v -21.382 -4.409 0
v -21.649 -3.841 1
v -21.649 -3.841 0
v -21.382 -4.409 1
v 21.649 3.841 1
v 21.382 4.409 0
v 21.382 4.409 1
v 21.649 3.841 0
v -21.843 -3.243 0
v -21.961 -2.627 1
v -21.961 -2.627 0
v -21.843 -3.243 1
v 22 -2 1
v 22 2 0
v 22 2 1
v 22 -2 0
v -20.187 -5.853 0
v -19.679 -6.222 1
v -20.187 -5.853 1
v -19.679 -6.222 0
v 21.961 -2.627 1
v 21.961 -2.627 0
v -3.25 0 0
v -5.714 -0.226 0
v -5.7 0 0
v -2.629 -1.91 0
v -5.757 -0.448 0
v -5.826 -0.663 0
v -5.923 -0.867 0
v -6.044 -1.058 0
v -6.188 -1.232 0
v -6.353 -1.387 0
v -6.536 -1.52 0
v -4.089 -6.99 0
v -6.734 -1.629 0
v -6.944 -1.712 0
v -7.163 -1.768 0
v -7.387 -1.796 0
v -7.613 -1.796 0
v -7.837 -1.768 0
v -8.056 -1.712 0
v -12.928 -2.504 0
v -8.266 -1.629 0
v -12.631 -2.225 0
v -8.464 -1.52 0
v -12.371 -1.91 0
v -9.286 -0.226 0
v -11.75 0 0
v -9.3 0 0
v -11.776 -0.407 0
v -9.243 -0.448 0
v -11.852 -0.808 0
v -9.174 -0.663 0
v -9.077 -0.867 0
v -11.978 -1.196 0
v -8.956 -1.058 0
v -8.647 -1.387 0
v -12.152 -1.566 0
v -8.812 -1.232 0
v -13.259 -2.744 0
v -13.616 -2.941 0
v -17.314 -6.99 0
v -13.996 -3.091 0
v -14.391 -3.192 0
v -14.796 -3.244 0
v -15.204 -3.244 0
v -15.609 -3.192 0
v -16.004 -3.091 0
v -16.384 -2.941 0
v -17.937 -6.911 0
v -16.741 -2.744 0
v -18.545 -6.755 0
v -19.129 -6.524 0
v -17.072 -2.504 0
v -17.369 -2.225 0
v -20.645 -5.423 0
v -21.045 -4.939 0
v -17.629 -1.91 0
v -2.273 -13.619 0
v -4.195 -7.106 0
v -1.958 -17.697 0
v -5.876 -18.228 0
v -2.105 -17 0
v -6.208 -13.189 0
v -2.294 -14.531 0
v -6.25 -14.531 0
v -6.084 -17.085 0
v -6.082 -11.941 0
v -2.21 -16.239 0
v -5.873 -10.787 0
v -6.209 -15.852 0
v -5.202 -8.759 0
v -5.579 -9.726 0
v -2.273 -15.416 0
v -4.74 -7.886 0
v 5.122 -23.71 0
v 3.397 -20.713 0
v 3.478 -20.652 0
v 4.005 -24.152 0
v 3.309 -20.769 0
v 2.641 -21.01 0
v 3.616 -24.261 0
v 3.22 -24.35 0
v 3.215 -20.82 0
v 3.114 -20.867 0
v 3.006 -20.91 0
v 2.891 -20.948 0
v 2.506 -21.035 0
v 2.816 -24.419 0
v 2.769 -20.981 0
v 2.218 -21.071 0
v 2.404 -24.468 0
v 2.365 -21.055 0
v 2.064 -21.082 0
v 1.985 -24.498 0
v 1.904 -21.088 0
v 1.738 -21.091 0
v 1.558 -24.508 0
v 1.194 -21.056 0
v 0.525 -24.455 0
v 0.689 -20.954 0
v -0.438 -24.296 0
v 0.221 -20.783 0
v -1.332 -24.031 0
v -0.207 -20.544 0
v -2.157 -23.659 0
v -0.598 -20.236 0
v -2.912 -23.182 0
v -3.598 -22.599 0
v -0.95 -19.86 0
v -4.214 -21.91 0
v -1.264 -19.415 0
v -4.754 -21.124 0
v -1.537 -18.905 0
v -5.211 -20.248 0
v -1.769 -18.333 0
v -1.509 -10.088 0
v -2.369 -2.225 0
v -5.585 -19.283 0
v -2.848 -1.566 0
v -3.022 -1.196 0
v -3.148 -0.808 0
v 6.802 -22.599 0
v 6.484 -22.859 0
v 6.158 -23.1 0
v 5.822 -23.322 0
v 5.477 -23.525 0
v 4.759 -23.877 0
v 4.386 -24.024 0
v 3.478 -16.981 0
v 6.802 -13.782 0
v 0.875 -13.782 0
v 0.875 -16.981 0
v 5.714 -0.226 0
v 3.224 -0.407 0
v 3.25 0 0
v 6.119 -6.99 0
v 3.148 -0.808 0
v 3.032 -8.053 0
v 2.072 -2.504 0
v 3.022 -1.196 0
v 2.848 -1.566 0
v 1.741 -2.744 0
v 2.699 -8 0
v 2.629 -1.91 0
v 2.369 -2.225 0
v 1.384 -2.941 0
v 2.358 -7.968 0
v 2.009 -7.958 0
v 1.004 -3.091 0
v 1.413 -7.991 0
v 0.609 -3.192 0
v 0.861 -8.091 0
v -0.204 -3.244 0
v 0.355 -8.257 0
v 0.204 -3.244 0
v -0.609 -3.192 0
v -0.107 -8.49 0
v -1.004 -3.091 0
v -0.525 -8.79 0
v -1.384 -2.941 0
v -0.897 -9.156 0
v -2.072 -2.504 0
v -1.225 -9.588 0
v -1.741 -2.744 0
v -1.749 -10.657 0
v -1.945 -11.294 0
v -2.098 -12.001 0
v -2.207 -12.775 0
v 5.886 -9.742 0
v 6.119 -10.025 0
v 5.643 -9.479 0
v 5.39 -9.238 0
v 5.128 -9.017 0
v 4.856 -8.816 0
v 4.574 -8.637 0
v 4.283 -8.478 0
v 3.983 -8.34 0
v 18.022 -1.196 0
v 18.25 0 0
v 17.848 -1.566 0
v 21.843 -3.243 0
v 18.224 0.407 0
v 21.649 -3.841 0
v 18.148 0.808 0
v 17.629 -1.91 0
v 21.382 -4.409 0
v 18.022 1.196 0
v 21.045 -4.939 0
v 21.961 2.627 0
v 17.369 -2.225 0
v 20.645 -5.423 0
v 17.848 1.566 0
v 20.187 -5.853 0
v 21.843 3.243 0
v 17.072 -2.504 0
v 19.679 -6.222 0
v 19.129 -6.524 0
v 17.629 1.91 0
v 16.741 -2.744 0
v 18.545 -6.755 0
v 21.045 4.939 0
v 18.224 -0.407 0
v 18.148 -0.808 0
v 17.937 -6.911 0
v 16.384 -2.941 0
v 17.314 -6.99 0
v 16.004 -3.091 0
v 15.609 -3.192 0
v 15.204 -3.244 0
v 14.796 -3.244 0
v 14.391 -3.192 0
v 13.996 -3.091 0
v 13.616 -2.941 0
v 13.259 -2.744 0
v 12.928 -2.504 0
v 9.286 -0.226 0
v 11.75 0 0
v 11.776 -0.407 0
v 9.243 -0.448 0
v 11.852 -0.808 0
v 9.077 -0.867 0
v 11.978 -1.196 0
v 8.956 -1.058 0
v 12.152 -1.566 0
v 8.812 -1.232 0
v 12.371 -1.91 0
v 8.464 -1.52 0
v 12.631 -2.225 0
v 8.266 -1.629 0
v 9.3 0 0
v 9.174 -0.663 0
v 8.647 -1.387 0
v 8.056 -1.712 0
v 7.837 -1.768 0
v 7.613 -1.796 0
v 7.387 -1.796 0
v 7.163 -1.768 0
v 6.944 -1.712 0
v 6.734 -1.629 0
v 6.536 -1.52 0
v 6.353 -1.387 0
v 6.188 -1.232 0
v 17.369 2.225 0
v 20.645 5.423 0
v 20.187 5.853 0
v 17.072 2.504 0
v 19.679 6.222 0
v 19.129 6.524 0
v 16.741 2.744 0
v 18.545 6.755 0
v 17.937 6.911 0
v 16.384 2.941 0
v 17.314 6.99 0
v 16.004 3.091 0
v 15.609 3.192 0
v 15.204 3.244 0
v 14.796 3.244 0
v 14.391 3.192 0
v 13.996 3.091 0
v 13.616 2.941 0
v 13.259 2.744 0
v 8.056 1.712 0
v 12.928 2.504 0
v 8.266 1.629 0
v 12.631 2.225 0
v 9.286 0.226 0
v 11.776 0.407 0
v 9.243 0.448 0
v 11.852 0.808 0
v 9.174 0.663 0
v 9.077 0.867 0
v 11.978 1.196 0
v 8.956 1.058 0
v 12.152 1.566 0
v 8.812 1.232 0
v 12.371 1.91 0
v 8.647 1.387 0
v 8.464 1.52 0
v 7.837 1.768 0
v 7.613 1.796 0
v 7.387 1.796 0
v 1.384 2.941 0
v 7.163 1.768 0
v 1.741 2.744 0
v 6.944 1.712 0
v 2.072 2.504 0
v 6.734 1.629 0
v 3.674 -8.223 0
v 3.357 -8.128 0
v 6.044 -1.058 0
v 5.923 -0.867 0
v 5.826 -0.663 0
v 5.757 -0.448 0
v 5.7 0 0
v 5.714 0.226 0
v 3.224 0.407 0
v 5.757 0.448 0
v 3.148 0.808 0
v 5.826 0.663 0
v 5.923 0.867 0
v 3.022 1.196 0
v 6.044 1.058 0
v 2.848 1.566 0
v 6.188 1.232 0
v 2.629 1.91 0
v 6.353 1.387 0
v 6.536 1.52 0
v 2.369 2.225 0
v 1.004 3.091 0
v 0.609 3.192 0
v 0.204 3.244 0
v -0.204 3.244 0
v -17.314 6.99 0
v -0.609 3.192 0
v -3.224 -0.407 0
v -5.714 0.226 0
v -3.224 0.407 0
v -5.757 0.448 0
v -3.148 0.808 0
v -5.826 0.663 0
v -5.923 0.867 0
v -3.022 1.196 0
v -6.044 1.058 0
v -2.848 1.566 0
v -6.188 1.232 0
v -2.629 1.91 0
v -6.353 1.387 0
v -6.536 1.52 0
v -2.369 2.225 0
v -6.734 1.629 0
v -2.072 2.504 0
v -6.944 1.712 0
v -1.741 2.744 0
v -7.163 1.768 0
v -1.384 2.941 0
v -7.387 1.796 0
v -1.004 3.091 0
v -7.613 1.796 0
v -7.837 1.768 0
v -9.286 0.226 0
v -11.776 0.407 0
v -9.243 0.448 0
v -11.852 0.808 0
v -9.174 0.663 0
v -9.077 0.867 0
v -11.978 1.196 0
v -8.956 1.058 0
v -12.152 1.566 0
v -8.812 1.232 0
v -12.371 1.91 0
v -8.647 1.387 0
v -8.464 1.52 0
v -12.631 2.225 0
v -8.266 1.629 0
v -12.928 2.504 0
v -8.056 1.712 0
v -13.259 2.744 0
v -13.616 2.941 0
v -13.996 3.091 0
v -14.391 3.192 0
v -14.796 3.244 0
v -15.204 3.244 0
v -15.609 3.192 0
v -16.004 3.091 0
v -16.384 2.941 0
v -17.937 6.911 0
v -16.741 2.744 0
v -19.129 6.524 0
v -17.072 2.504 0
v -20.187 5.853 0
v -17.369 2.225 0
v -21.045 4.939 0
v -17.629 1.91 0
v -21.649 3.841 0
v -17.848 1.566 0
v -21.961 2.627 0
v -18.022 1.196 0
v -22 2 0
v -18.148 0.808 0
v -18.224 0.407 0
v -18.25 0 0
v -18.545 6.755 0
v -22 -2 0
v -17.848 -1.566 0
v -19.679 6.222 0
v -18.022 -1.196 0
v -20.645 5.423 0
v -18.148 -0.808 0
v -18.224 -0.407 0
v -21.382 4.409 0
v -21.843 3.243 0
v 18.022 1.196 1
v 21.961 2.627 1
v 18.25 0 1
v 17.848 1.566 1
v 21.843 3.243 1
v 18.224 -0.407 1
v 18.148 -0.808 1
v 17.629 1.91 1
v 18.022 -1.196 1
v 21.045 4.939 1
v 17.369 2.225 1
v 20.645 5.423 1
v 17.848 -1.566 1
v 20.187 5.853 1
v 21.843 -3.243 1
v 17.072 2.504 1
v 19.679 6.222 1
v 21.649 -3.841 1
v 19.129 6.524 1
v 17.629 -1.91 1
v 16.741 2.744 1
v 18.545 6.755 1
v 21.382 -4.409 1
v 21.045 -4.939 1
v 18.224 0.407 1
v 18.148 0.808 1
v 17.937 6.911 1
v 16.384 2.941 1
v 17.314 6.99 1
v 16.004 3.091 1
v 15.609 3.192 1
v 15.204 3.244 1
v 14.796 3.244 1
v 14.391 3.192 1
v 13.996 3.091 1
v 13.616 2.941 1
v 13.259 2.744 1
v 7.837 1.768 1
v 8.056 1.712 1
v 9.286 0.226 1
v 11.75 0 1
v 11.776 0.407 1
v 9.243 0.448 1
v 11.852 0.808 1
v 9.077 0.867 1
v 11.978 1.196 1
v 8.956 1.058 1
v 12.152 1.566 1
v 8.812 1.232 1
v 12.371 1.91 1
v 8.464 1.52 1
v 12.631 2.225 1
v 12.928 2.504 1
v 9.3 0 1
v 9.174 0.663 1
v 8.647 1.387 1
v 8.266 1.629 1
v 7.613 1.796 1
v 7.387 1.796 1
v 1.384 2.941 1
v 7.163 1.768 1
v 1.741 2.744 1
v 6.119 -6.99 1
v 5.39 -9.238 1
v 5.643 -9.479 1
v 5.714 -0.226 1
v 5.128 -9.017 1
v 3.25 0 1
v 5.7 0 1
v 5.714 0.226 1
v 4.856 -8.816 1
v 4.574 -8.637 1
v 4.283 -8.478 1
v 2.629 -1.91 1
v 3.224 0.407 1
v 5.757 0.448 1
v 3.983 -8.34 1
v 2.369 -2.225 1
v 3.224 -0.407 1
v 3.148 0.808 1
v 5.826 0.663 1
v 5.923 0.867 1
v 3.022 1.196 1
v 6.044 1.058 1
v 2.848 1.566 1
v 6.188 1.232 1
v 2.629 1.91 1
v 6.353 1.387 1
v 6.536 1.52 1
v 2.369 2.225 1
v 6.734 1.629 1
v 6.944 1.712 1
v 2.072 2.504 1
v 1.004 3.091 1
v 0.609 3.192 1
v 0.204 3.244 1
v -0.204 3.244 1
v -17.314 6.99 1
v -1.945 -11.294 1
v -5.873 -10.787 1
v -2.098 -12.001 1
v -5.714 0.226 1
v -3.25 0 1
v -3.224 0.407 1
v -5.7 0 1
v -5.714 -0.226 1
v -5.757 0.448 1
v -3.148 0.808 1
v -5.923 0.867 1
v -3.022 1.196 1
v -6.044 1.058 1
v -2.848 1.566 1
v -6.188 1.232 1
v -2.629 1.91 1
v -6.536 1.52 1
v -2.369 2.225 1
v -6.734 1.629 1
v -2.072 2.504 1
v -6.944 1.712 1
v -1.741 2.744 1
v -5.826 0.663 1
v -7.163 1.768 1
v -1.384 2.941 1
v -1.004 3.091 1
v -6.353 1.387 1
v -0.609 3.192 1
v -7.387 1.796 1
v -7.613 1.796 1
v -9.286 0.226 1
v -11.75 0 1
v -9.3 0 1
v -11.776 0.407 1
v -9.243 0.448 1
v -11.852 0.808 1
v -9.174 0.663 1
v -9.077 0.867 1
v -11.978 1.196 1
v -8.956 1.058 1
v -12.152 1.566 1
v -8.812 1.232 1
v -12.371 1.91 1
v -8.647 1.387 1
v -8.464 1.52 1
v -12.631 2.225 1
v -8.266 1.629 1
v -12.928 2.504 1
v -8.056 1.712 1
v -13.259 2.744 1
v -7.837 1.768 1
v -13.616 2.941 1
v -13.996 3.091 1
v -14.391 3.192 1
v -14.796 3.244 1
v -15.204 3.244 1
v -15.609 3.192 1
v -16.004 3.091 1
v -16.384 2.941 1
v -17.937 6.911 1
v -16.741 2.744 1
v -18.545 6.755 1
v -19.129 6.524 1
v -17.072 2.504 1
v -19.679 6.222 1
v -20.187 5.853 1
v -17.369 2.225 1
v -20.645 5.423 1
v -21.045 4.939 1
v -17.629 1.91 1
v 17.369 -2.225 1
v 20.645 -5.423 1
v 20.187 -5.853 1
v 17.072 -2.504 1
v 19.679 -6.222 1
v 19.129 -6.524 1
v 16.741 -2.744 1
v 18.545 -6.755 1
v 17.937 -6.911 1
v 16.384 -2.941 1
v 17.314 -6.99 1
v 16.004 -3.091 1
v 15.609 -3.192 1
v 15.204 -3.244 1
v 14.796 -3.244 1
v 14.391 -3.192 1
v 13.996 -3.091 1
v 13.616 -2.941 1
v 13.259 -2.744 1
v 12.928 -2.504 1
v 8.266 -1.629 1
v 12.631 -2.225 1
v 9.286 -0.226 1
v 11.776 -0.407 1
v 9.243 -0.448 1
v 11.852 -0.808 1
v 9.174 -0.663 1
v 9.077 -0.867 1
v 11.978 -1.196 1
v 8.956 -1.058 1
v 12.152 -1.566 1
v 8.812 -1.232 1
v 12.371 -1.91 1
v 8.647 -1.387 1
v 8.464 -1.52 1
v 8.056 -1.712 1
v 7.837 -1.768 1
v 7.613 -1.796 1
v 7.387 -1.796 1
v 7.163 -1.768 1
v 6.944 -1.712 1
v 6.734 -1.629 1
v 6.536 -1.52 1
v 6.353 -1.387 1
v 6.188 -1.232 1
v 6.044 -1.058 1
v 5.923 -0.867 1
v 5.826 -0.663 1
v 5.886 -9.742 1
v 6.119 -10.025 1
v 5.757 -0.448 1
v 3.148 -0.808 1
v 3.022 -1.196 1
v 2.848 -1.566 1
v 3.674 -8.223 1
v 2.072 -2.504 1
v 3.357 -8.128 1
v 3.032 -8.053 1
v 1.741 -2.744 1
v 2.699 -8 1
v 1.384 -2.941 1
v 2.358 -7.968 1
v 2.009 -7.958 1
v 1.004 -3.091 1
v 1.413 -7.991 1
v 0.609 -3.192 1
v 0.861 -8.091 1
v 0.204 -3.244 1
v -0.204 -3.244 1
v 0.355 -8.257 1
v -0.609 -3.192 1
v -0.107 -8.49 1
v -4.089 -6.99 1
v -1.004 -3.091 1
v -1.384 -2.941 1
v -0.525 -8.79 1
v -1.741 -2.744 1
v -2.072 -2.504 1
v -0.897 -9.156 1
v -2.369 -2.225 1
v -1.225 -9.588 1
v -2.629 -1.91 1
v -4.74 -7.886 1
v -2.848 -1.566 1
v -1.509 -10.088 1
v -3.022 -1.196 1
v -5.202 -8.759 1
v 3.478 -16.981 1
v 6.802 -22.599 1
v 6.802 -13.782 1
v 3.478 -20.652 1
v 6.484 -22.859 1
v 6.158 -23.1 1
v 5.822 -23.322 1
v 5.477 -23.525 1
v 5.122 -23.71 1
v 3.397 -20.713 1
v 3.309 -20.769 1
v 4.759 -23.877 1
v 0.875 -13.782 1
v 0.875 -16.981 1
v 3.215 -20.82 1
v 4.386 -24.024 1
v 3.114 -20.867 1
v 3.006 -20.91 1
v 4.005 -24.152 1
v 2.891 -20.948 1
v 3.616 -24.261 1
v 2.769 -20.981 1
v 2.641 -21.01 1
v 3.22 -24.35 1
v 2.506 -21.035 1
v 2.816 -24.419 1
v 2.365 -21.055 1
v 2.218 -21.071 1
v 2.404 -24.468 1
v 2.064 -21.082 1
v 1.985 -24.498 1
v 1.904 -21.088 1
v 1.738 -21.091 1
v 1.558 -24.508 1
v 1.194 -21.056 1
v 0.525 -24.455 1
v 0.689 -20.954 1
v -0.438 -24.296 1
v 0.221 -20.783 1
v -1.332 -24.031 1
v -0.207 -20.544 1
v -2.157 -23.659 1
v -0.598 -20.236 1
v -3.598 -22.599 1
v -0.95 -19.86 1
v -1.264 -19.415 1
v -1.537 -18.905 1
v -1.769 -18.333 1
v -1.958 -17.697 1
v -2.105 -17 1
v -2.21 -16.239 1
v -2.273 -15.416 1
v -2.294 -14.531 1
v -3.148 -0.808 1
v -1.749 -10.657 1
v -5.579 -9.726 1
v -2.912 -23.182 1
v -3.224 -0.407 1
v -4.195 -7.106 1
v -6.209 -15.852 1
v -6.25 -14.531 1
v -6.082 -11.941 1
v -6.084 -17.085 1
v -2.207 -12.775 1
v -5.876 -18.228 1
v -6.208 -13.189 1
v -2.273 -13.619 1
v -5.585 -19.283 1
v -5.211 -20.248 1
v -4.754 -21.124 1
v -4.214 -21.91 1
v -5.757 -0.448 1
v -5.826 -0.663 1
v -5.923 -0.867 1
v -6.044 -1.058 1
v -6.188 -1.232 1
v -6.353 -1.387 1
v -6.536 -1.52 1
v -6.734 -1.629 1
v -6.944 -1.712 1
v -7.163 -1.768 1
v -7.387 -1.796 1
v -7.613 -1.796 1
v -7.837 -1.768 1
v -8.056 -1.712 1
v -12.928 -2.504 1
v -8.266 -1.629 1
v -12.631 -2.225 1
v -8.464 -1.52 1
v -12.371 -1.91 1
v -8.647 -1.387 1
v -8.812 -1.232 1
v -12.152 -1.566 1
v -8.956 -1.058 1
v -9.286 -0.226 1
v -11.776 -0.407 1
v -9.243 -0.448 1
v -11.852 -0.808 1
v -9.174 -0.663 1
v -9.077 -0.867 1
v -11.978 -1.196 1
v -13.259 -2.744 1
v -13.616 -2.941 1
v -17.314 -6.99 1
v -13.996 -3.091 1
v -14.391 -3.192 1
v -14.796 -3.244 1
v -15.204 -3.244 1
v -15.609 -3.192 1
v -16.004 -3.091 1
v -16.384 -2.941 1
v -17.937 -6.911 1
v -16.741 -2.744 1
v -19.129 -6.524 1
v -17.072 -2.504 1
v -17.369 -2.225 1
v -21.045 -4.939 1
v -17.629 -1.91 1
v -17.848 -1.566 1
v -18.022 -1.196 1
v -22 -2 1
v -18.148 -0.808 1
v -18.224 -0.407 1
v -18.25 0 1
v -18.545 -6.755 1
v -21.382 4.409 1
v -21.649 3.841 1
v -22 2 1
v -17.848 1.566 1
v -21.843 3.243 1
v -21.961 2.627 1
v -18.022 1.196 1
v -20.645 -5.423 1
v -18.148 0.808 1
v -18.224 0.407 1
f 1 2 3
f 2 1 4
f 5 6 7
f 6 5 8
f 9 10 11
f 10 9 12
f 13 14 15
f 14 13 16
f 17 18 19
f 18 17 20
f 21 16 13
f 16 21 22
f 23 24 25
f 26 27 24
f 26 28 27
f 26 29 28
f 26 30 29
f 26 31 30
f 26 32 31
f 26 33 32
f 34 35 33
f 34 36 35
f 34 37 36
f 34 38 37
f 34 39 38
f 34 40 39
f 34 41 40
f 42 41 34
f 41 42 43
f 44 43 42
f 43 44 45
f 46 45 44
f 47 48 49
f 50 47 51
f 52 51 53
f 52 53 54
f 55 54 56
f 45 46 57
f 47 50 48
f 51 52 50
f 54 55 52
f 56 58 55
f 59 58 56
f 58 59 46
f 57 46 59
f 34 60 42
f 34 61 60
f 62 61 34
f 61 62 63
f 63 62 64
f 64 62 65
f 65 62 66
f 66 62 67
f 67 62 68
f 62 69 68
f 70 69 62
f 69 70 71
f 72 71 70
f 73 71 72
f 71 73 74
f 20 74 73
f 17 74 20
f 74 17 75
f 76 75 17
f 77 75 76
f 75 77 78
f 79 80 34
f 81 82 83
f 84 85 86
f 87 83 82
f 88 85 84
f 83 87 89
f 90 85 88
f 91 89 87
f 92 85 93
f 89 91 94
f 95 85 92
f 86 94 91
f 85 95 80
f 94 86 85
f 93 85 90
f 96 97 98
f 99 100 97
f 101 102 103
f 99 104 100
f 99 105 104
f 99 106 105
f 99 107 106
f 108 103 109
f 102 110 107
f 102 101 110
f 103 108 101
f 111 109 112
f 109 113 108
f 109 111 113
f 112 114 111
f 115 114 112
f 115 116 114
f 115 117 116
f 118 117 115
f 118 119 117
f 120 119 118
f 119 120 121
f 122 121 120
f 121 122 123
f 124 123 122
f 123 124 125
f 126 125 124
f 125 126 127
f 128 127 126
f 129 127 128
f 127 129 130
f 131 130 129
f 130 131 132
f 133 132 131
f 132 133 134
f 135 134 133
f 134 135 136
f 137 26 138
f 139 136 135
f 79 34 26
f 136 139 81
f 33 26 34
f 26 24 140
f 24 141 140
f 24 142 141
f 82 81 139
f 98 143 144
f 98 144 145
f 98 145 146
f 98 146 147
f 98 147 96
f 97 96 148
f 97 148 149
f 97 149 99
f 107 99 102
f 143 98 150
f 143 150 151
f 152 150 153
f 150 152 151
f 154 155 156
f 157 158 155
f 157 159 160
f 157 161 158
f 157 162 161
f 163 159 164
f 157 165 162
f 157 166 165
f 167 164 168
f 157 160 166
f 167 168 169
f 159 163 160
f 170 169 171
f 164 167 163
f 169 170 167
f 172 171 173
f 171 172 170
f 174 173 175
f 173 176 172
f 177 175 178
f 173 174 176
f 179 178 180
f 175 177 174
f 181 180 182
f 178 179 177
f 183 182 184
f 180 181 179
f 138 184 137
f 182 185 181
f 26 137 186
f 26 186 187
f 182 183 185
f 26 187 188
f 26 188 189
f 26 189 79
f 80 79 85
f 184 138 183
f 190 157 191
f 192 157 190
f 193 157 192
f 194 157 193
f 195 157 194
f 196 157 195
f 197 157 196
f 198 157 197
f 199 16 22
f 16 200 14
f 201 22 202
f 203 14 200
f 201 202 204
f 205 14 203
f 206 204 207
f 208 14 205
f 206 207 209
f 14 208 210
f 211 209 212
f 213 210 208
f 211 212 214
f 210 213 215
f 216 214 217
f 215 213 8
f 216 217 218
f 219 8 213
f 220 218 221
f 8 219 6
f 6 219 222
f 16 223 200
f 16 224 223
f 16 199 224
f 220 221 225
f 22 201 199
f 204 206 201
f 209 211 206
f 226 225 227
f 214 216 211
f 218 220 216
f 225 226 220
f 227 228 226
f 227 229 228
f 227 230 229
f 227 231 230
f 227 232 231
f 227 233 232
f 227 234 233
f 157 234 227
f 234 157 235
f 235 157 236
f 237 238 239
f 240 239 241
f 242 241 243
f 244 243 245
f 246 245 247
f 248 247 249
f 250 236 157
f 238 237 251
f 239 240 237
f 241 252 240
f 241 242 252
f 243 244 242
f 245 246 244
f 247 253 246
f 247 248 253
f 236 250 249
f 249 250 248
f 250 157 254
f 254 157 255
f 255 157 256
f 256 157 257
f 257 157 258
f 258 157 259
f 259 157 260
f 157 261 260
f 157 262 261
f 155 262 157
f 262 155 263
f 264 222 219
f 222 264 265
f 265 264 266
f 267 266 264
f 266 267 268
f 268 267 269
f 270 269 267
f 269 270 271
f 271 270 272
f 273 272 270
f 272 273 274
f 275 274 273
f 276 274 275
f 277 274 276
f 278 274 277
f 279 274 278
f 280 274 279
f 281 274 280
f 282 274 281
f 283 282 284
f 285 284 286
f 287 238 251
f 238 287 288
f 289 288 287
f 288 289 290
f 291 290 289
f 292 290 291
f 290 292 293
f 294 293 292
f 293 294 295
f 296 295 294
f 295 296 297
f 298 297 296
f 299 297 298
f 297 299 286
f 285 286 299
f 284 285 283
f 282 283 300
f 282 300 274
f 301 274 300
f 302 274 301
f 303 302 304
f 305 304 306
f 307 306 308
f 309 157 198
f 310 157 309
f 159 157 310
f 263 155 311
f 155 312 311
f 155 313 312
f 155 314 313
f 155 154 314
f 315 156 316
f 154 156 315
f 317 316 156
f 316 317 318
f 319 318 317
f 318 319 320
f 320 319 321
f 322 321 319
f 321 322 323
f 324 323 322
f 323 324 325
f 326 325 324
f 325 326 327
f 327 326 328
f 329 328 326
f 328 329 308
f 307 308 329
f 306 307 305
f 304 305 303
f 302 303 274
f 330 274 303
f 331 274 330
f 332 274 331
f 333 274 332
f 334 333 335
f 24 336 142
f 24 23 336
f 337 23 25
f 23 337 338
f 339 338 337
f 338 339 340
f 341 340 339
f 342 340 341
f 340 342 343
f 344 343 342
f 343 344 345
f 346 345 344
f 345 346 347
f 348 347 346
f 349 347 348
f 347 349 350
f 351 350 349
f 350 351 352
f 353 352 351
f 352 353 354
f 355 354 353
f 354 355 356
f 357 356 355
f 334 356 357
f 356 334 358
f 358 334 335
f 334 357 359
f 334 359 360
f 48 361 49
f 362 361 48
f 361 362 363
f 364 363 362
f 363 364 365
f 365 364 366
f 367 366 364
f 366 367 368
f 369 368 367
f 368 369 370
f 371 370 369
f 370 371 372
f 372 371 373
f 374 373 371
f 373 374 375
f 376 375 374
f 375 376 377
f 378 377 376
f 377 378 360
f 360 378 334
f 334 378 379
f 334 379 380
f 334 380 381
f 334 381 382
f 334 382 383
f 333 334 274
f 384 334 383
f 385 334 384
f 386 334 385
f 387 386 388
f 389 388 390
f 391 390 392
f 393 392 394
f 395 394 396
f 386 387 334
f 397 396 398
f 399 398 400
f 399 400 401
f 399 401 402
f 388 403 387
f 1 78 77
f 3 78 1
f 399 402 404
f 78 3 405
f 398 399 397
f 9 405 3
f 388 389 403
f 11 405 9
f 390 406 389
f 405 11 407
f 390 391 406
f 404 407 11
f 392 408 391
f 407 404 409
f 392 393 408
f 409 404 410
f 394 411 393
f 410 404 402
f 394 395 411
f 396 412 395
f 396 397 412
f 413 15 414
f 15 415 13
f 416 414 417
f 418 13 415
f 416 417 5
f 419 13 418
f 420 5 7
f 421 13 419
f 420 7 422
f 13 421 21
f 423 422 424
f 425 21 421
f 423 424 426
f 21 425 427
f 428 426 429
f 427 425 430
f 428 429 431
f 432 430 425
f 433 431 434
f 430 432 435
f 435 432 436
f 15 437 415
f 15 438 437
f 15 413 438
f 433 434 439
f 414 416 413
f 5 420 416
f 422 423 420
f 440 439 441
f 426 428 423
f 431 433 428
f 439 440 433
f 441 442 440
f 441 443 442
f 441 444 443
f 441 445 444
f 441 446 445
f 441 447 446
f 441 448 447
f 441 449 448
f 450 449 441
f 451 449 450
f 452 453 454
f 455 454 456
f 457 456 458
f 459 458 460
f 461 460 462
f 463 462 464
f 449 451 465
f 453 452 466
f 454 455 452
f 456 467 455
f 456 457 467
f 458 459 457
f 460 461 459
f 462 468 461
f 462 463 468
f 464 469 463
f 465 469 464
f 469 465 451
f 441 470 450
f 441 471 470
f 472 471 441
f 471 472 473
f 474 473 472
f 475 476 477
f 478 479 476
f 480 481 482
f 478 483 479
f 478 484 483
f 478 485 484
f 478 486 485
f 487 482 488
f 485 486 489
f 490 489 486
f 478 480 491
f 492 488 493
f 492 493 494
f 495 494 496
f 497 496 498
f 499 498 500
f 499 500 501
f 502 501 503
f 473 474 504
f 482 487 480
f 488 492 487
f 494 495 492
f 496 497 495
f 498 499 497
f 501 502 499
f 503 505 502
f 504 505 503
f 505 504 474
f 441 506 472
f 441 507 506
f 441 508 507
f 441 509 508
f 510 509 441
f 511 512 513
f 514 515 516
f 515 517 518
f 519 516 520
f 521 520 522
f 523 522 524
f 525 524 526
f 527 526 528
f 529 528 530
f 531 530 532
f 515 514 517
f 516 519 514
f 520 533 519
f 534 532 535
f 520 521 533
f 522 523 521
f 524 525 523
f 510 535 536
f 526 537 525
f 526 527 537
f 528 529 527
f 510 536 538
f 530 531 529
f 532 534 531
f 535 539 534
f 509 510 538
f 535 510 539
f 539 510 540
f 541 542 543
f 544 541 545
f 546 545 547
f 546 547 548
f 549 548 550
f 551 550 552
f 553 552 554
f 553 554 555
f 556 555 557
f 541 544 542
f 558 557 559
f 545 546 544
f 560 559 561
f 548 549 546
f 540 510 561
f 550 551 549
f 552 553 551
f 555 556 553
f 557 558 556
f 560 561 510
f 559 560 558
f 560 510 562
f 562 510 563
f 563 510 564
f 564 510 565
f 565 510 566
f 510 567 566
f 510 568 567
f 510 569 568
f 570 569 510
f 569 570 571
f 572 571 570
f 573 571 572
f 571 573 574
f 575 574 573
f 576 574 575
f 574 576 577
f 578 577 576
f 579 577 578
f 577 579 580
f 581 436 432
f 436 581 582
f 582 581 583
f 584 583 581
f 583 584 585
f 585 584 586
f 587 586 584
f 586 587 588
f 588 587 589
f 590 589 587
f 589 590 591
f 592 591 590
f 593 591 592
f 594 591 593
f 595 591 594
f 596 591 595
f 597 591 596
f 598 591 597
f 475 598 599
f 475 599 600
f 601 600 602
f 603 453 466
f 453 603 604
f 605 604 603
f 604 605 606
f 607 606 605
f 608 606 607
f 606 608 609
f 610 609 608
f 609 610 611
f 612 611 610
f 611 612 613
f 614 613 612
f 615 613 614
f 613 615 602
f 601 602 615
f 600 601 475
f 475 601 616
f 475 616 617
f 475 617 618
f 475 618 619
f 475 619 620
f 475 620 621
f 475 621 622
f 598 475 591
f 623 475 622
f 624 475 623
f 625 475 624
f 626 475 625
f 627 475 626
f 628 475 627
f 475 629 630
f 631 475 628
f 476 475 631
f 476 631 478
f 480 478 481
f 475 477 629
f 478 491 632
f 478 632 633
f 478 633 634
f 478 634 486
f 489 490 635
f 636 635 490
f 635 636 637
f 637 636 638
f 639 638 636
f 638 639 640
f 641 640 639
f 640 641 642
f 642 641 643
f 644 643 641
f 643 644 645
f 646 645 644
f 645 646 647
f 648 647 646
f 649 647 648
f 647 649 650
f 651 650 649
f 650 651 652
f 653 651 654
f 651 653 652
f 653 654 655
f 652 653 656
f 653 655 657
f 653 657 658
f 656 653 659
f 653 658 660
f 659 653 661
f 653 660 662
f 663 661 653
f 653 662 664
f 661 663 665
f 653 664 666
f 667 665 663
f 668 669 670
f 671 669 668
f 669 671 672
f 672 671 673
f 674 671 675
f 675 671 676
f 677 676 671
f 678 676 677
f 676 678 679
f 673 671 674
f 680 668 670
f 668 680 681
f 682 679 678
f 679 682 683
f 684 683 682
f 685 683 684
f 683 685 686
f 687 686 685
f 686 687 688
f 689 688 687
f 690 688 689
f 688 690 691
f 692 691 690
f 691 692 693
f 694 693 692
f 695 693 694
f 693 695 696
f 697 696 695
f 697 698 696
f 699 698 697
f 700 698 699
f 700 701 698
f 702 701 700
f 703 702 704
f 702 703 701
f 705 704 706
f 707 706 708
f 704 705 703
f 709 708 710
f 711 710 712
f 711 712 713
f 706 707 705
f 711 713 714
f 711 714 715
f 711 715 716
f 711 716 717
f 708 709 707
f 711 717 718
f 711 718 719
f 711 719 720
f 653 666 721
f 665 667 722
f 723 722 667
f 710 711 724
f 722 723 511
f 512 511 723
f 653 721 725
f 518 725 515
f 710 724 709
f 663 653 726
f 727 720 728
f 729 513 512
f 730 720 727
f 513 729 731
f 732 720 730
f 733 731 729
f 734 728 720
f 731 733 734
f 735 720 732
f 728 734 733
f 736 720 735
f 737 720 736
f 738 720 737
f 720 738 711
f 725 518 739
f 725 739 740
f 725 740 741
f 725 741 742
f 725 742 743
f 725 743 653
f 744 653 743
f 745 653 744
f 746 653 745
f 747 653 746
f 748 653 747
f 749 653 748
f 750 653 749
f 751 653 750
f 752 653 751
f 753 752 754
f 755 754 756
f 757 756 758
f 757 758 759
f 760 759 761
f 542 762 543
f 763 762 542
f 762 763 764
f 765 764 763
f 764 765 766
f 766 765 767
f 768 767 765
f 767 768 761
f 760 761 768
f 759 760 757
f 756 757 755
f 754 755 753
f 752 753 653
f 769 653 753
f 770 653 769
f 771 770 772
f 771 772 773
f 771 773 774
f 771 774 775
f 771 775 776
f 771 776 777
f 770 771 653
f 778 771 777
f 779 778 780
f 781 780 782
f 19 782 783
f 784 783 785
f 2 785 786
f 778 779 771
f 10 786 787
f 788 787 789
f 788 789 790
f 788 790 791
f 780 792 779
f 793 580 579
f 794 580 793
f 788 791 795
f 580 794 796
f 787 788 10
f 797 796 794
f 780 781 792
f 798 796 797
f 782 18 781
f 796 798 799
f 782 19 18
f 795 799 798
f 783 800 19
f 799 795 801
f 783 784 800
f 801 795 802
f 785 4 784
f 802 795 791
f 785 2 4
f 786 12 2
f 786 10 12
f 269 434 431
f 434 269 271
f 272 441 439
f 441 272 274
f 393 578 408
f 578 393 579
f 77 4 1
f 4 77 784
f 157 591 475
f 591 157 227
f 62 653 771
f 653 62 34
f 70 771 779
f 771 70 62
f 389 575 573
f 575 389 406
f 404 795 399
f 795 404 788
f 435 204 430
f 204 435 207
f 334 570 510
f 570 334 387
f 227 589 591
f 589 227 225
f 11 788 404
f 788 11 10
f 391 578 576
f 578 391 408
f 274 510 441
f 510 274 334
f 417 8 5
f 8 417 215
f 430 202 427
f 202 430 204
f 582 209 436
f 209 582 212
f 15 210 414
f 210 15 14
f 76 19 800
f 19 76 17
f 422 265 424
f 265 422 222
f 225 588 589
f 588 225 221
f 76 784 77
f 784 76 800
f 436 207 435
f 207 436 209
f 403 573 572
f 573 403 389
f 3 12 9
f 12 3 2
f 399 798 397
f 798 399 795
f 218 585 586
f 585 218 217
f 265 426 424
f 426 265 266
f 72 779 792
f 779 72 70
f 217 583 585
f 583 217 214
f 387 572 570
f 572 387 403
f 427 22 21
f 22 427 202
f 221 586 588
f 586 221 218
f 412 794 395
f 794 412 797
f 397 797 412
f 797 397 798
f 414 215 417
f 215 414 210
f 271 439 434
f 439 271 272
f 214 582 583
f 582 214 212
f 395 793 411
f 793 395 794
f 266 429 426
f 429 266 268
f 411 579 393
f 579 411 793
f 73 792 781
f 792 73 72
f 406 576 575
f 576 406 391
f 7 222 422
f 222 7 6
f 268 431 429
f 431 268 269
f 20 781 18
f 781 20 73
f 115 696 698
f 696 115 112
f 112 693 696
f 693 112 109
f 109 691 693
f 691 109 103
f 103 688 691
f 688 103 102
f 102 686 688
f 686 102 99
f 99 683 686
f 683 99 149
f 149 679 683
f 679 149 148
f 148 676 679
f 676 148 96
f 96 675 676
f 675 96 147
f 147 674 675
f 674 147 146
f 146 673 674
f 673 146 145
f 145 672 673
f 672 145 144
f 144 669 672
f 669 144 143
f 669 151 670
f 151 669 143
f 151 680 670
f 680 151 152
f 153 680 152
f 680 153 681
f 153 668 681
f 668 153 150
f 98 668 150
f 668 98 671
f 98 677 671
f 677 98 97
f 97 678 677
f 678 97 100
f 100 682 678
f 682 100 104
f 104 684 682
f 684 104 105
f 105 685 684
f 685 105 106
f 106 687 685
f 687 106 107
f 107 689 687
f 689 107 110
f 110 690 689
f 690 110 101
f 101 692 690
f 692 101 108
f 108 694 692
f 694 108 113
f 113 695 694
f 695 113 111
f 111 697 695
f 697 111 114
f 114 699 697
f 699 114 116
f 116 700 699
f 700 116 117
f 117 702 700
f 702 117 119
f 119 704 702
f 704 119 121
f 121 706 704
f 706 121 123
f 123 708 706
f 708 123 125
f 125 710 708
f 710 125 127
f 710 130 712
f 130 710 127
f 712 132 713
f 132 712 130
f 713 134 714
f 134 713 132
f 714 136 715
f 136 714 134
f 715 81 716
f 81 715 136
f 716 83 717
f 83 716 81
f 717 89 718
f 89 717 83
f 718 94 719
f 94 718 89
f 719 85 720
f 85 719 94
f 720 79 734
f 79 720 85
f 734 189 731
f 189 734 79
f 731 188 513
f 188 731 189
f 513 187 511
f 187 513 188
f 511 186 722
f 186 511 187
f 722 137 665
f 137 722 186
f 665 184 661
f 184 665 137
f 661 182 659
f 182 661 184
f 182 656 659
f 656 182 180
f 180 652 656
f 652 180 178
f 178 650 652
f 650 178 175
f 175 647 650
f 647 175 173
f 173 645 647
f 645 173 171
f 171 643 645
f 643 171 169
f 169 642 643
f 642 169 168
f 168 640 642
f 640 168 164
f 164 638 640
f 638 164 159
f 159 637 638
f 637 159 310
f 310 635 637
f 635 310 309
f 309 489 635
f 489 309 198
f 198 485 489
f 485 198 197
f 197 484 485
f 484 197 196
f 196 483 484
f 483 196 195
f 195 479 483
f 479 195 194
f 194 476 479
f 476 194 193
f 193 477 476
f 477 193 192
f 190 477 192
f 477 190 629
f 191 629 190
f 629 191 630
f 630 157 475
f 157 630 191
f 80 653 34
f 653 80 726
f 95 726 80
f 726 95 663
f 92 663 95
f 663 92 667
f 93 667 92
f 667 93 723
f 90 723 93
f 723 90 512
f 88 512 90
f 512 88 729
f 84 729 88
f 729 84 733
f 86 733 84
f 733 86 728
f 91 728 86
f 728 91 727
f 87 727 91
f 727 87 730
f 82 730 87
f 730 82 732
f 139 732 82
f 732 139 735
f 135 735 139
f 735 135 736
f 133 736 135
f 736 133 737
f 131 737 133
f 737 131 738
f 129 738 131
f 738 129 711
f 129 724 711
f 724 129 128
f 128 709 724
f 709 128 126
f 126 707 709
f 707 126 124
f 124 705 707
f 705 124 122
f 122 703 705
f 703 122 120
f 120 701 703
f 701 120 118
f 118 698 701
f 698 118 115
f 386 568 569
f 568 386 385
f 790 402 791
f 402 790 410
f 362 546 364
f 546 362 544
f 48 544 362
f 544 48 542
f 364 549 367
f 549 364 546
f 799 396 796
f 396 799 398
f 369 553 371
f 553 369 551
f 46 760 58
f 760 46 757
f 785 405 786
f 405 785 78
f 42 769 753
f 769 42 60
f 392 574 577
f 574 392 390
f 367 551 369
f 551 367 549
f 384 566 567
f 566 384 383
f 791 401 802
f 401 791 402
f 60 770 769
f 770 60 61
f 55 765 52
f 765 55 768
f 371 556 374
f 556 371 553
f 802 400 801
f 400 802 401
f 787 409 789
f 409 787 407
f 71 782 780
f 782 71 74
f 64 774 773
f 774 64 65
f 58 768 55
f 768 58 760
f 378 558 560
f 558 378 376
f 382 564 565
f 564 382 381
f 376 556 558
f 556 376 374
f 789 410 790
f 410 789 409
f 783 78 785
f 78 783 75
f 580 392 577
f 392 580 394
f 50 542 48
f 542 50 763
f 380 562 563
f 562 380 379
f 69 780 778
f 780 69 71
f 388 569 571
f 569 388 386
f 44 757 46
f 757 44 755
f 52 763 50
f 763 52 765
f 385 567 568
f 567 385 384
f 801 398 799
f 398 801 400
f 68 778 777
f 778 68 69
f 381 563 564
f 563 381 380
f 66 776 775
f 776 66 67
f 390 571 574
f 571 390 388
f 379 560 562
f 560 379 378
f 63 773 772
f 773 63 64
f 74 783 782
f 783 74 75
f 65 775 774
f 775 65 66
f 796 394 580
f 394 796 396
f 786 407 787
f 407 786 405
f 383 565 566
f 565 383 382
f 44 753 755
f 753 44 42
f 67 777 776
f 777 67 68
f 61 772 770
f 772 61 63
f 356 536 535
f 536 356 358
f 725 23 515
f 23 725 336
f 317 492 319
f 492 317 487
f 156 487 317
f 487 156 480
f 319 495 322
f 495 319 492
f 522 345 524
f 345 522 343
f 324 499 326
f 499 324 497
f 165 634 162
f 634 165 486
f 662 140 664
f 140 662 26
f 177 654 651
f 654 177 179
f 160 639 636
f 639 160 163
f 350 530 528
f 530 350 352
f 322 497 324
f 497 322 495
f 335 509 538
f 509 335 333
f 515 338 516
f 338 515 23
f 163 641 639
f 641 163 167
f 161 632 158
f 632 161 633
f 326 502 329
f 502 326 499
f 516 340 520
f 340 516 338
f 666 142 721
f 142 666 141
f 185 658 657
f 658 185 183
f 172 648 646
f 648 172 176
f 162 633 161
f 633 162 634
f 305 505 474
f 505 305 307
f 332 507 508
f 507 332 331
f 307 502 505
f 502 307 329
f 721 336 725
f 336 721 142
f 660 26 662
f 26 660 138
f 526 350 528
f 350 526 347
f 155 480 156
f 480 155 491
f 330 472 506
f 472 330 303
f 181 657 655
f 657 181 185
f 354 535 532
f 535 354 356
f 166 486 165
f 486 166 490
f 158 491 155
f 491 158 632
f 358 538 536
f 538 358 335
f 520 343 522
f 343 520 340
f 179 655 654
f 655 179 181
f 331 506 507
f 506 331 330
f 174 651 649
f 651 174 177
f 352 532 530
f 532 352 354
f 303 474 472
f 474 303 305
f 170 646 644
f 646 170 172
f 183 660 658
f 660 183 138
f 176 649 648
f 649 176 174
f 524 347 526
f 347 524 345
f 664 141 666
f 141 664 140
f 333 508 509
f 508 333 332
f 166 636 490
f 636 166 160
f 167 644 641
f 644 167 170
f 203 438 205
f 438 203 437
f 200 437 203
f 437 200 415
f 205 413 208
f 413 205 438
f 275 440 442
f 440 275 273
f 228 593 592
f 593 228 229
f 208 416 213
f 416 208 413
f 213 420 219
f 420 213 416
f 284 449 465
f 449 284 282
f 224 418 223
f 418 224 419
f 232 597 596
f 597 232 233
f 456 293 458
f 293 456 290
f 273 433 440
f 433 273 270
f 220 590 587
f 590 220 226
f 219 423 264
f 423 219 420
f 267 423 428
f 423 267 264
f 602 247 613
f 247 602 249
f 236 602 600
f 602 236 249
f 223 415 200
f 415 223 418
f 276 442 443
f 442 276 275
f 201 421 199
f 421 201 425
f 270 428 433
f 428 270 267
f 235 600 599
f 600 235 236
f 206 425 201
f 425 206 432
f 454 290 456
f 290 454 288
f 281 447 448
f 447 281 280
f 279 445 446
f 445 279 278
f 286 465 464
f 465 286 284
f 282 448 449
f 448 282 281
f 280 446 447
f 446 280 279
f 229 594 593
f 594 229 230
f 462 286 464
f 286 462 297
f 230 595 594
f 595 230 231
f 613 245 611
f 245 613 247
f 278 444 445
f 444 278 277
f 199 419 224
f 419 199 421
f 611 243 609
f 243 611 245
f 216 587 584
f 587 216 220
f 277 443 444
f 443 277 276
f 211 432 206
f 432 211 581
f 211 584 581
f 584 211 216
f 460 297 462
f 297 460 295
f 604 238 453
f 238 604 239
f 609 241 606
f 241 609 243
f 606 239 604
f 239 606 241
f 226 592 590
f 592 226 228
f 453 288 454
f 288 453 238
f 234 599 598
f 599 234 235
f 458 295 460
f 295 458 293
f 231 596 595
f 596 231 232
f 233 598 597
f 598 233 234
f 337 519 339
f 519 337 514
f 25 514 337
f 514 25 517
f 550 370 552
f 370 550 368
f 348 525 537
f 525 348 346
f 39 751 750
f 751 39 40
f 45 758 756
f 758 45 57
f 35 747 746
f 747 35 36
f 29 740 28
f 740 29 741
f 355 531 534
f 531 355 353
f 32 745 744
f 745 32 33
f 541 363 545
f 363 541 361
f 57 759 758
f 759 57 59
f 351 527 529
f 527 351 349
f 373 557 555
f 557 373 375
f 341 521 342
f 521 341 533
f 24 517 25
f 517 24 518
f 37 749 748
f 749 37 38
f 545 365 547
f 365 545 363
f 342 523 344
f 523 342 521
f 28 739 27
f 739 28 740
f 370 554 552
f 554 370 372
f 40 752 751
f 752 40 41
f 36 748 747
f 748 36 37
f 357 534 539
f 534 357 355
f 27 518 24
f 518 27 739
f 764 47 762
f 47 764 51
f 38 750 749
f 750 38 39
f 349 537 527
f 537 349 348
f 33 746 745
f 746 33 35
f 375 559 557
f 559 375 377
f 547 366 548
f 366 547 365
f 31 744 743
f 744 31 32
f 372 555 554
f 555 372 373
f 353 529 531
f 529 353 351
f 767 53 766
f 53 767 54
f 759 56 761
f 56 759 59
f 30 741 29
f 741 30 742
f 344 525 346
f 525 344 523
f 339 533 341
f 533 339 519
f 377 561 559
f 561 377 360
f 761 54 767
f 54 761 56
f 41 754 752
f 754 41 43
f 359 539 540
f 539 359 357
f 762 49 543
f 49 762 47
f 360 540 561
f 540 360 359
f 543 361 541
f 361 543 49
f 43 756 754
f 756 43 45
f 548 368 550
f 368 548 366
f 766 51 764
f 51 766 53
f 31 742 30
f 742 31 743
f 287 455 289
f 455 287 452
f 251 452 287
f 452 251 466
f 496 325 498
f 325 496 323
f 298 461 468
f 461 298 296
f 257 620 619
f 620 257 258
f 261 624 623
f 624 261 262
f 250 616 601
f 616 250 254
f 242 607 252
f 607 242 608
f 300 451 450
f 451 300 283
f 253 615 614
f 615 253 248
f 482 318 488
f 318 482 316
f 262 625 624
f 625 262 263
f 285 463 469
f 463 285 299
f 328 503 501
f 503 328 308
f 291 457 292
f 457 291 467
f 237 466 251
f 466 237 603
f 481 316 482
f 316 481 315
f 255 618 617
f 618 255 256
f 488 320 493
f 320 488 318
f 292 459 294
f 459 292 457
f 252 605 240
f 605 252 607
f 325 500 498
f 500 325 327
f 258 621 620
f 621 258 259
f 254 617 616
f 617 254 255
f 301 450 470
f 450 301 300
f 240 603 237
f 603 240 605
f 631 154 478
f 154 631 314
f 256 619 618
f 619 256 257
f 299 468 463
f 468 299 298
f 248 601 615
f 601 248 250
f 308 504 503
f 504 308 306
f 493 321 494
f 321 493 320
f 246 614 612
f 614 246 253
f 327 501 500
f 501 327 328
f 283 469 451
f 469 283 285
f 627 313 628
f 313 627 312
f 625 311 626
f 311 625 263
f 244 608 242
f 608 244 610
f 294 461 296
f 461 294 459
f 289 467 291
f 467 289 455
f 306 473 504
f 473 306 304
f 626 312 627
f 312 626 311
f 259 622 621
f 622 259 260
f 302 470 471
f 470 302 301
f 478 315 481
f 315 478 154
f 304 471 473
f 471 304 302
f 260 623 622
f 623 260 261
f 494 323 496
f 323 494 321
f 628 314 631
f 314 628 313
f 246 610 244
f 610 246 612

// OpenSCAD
$fn = 50;


difference() {
	union() {
		*color(alpha = 1.0000000000, c = "gray") {
			translate(v = [0, 14, 0]) {
				linear_extrude(height = 1) {
					text(font = "Arial:style=Bold", halign = "center", size = 4.5000000000, text = "COMMENT description oobb_plate_shape_p_type_1_depth_3_width_1_thickness_g_extra_oobb_size", valign = "center");
				}
			}
		}
		hull() {
			translate(v = [-17.0000000000, 2.0000000000, 0]) {
				cylinder(h = 1, r = 5);
			}
			translate(v = [17.0000000000, 2.0000000000, 0]) {
				cylinder(h = 1, r = 5);
			}
			translate(v = [-17.0000000000, -2.0000000000, 0]) {
				cylinder(h = 1, r = 5);
			}
			translate(v = [17.0000000000, -2.0000000000, 0]) {
				cylinder(h = 1, r = 5);
			}
		}
		translate(v = [0, -5, 0]) {
			linear_extrude(height = 1) {
				text(font = "DejaVu Sans Mono:style=Bold", halign = "center", size = 19.0000000000, text = "G", valign = "top");
			}
		}
	}
	union() {
		*color(alpha = 1.0000000000, c = "gray") {
			translate(v = [0, 14, 0]) {
				linear_extrude(height = 1) {
					text(font = "Arial:style=Bold", halign = "center", size = 4.5000000000, text = "COMMENT description oobb_holes_shape_n_type_3_width_1_thickness_g_extra_oobb_size_1_height_'all'_holes_true_both_holes", valign = "center");
				}
			}
		}
		translate(v = [-15.0000000000, 0.0000000000, 0]) {
			translate(v = [0, 0, -50]) {
				cylinder(h = 100, r = 3.2500000000);
			}
		}
		translate(v = [0, 0, -50]) {
			cylinder(h = 100, r = 3.2500000000);
		}
		translate(v = [15.0000000000, 0.0000000000, 0]) {
			translate(v = [0, 0, -50]) {
				cylinder(h = 100, r = 3.2500000000);
			}
		}
		translate(v = [-15.0000000000, 0.0000000000, 0]) {
			translate(v = [0, 0, -50]) {
				cylinder(h = 100, r = 1.8000000000);
			}
		}
		translate(v = [-7.5000000000, 0.0000000000, 0]) {
			translate(v = [0, 0, -50]) {
				cylinder(h = 100, r = 1.8000000000);
			}
		}
		translate(v = [0, 0, -50]) {
			cylinder(h = 100, r = 1.8000000000);
		}
		translate(v = [7.5000000000, 0.0000000000, 0]) {
			translate(v = [0, 0, -50]) {
				cylinder(h = 100, r = 1.8000000000);
			}
		}
		translate(v = [15.0000000000, 0.0000000000, 0]) {
			translate(v = [0, 0, -50]) {
				cylinder(h = 100, r = 1.8000000000);
			}
		}
	}
}
